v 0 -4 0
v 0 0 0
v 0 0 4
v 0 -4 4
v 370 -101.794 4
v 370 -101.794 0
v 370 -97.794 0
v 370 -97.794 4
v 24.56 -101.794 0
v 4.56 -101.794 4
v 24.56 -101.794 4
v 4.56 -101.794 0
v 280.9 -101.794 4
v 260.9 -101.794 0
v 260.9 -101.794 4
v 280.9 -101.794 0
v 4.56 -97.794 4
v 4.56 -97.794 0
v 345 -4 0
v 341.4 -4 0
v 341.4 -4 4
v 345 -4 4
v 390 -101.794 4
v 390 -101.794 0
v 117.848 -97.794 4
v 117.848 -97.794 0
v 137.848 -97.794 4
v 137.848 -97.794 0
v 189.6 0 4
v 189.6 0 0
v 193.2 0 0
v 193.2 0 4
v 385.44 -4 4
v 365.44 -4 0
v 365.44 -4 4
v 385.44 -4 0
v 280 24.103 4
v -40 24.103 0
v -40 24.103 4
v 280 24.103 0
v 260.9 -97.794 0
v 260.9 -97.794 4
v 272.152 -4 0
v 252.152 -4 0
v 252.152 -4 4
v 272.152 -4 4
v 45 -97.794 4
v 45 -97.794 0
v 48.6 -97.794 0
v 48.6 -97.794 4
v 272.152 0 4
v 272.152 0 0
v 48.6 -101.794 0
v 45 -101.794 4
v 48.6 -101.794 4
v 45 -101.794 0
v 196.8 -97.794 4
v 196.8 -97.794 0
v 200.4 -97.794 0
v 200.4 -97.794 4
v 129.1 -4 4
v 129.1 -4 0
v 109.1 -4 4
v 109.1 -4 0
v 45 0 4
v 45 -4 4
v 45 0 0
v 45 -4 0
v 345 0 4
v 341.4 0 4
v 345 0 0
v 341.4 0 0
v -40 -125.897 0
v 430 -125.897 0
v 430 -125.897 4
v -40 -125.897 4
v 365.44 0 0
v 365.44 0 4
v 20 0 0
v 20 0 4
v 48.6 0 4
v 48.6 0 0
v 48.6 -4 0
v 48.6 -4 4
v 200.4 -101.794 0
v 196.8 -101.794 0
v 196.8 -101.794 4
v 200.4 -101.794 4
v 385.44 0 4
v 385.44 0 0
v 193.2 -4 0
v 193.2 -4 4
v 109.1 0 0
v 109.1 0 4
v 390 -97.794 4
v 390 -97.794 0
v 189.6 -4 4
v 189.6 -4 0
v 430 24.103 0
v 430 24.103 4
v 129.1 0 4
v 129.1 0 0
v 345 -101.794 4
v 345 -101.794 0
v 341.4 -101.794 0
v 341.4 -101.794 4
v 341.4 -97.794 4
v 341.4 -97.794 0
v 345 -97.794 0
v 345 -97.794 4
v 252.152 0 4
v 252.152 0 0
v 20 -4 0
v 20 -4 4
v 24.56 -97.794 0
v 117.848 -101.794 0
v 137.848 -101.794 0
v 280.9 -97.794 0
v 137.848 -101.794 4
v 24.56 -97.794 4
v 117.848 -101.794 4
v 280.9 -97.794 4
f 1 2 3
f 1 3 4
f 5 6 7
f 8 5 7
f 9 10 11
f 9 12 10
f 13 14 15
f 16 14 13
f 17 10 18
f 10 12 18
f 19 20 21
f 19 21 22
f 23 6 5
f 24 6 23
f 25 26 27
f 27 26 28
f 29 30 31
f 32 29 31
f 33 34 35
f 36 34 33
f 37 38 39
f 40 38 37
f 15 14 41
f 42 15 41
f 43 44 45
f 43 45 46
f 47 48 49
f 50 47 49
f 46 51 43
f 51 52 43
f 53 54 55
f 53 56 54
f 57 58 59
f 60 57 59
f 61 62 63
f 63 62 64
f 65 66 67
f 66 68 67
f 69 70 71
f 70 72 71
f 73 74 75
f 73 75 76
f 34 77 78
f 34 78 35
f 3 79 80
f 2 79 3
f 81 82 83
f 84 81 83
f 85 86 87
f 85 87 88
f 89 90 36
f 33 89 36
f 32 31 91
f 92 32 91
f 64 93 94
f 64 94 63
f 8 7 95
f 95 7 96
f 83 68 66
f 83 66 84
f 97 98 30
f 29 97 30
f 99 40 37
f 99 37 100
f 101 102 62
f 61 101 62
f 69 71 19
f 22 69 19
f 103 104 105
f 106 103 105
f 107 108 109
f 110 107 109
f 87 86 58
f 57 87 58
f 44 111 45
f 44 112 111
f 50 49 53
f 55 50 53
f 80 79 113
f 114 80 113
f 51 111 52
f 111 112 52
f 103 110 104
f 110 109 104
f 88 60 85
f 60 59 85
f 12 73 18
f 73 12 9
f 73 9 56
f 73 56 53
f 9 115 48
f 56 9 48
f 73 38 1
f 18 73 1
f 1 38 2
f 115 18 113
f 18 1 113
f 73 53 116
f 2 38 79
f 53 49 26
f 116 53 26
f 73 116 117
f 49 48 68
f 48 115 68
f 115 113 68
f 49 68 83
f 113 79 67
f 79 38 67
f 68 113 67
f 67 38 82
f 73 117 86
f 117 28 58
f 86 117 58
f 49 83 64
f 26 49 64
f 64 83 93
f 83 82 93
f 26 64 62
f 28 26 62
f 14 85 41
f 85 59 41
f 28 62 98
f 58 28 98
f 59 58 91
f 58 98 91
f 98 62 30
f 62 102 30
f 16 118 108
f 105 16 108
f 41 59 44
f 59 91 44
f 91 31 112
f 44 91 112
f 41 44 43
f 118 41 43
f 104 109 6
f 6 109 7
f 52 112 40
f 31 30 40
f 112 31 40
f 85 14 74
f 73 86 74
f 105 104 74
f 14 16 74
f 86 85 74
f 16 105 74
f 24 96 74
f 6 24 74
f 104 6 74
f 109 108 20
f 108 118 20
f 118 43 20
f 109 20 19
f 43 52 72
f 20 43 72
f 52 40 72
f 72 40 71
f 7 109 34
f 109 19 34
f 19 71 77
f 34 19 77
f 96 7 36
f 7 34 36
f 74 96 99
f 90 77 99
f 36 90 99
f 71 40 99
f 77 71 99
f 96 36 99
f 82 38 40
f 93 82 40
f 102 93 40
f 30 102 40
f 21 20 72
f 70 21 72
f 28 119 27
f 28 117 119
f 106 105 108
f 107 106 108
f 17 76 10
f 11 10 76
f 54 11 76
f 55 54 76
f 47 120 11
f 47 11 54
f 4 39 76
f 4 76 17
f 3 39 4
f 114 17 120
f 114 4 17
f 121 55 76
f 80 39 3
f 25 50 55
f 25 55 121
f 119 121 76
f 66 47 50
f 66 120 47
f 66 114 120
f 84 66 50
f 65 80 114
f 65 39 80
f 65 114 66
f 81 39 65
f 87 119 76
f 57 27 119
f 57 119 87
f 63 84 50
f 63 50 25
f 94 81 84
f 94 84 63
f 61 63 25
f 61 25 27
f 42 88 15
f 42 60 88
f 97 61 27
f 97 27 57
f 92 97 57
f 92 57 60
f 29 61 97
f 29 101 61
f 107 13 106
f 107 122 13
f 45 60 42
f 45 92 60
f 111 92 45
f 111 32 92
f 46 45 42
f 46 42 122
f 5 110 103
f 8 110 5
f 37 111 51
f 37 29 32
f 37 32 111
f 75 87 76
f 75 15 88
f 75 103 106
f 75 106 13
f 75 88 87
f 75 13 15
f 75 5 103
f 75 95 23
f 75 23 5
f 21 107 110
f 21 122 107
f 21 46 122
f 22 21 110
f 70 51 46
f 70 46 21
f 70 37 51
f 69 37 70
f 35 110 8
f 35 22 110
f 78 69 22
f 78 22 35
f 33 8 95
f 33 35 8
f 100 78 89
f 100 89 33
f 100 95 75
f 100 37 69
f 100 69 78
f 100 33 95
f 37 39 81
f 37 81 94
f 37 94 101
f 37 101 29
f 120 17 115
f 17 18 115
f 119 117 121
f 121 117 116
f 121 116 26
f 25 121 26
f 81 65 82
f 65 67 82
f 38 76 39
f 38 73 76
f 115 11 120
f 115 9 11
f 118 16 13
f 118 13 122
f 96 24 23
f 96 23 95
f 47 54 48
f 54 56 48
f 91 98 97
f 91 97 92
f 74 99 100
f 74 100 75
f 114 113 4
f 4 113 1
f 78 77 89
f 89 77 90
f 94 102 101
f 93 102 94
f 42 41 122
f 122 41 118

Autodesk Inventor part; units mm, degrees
ref_plane "YZ Plane" through (0, 0, 0) normal (1, 0, 0) x (0, 1, 0)
ref_plane "XZ Plane" through (0, 0, 0) normal (0, 1, 0) x (-1, 0, 0)
ref_plane "XY Plane" through (0, 0, 0) normal (0, 0, 1) x (1, 0, 0)
sketch "Sketch1" plane through (0, 0, 0) normal (0, 0, 1) x (1, 0, 0)
  line L0 (20, 0) -> (0, 0)
  line L1 (20, -4) -> (0, -4)
  line L2 (20, 0) -> (20, -4)
  line L3 (0, 0) -> (0, -4)
  line L4 (45, -4) -> (45, 0)
  line L5 (48.6, 0) -> (48.6, -4)
  line L6 (4.5603, -97.794) -> (24.5603, -97.794)
  line L7 (4.5603, -101.794) -> (24.5603, -101.794)
  line L8 (24.5603, -101.794) -> (24.5603, -97.794)
  line L9 (4.5603, -101.794) -> (4.5603, -97.794)
  line L10 (45, -101.794) -> (45, -97.794)
  line L11 (48.6, -97.794) -> (48.6, -101.794)
  line L12 (117.8484, -101.794) -> (117.8484, -97.794)
  line L13 (137.8484, -101.794) -> (137.8484, -97.794)
  line L14 (117.8484, -97.794) -> (137.8484, -97.794)
  line L15 (137.8484, -101.794) -> (117.8484, -101.794)
  line L16 (129.1, 0) -> (109.1, 0)
  line L17 (129.1, -4) -> (109.1, -4)
  line L18 (189.6, -4) -> (189.6, 0)
  line L19 (193.2, 0) -> (193.2, -4)
  line L20 (196.8, -101.794) -> (196.8, -97.794)
  line L21 (200.4, -97.794) -> (200.4, -101.794)
  line L22 (252.1516, 0) -> (252.1516, -4)
  line L23 (272.1516, 0) -> (272.1516, -4)
  line L24 (260.9, -101.794) -> (260.9, -97.794)
  line L25 (280.9, -101.794) -> (280.9, -97.794)
  line L26 (341.4, -4) -> (341.4, 0)
  line L27 (345, 0) -> (345, -4)
  line L28 (341.4, -101.794) -> (341.4, -97.794)
  line L29 (345, -97.794) -> (345, -101.794)
  line L30 (365.4397, 0) -> (365.4397, -4)
  line L31 (385.4397, 0) -> (385.4397, -4)
  line L32 (370, -101.794) -> (370, -97.794)
  line L33 (390, -101.794) -> (390, -97.794)
  line L34 (45, 0) -> (48.6, 0)
  line L35 (45, -4) -> (48.6, -4)
  line L36 (109.1, 0) -> (109.1, -4)
  line L37 (129.1, 0) -> (129.1, -4)
  line L38 (189.6, 0) -> (193.2, 0)
  line L39 (189.6, -4) -> (193.2, -4)
  line L40 (252.1516, 0) -> (272.1516, 0)
  line L41 (252.1516, -4) -> (272.1516, -4)
  line L42 (341.4, 0) -> (345, 0)
  line L43 (341.4, -4) -> (345, -4)
  line L44 (365.4397, 0) -> (385.4397, 0)
  line L45 (365.4397, -4) -> (385.4397, -4)
  line L46 (45, -97.794) -> (48.6, -97.794)
  line L47 (45, -101.794) -> (48.6, -101.794)
  line L48 (196.8, -97.794) -> (200.4, -97.794)
  line L49 (196.8, -101.794) -> (200.4, -101.794)
  line L50 (260.9, -97.794) -> (280.9, -97.794)
  line L51 (260.9, -101.794) -> (280.9, -101.794)
  line L52 (370, -97.794) -> (390, -97.794)
  line L53 (370, -101.794) -> (390, -101.794)
  line L54 (4.5603, -101.794) -> (0, -101.794)
  line L55 (-40, 24.103) -> (430, 24.103)
  line L56 (430, 24.103) -> (430, -125.897)
  line L57 (430, -125.897) -> (-40, -125.897)
  line L58 (-40, -125.897) -> (-40, 24.103)
  line L59 (-40, 24.103) -> (430, -125.897) construction
  line L60 (430, 24.103) -> (-40, -125.897) construction
  line L61 (430, 24.103) -> (280, 24.103)
  line L62 (280, 24.103) -> (280, 124.103)
  line L63 (280, 124.103) -> (430, 124.103)
  line L64 (430, 124.103) -> (430, 24.103)
  line L65 (341.4, -97.794) -> (345, -97.794)
  line L66 (390, -101.794) -> (370, -101.794)
  line L67 (345, -101.794) -> (341.4, -101.794)
  point P0 (195, -50.897)
  dimension "d0" = 470
  dimension "d1" = 150
  dimension "d2" = 150
  dimension "d3" = 100
extrude "Extrusion1" add sketch "Sketch1" along normal blind 4 contours L55 L56 L57 L58
properties part number "PISO"
